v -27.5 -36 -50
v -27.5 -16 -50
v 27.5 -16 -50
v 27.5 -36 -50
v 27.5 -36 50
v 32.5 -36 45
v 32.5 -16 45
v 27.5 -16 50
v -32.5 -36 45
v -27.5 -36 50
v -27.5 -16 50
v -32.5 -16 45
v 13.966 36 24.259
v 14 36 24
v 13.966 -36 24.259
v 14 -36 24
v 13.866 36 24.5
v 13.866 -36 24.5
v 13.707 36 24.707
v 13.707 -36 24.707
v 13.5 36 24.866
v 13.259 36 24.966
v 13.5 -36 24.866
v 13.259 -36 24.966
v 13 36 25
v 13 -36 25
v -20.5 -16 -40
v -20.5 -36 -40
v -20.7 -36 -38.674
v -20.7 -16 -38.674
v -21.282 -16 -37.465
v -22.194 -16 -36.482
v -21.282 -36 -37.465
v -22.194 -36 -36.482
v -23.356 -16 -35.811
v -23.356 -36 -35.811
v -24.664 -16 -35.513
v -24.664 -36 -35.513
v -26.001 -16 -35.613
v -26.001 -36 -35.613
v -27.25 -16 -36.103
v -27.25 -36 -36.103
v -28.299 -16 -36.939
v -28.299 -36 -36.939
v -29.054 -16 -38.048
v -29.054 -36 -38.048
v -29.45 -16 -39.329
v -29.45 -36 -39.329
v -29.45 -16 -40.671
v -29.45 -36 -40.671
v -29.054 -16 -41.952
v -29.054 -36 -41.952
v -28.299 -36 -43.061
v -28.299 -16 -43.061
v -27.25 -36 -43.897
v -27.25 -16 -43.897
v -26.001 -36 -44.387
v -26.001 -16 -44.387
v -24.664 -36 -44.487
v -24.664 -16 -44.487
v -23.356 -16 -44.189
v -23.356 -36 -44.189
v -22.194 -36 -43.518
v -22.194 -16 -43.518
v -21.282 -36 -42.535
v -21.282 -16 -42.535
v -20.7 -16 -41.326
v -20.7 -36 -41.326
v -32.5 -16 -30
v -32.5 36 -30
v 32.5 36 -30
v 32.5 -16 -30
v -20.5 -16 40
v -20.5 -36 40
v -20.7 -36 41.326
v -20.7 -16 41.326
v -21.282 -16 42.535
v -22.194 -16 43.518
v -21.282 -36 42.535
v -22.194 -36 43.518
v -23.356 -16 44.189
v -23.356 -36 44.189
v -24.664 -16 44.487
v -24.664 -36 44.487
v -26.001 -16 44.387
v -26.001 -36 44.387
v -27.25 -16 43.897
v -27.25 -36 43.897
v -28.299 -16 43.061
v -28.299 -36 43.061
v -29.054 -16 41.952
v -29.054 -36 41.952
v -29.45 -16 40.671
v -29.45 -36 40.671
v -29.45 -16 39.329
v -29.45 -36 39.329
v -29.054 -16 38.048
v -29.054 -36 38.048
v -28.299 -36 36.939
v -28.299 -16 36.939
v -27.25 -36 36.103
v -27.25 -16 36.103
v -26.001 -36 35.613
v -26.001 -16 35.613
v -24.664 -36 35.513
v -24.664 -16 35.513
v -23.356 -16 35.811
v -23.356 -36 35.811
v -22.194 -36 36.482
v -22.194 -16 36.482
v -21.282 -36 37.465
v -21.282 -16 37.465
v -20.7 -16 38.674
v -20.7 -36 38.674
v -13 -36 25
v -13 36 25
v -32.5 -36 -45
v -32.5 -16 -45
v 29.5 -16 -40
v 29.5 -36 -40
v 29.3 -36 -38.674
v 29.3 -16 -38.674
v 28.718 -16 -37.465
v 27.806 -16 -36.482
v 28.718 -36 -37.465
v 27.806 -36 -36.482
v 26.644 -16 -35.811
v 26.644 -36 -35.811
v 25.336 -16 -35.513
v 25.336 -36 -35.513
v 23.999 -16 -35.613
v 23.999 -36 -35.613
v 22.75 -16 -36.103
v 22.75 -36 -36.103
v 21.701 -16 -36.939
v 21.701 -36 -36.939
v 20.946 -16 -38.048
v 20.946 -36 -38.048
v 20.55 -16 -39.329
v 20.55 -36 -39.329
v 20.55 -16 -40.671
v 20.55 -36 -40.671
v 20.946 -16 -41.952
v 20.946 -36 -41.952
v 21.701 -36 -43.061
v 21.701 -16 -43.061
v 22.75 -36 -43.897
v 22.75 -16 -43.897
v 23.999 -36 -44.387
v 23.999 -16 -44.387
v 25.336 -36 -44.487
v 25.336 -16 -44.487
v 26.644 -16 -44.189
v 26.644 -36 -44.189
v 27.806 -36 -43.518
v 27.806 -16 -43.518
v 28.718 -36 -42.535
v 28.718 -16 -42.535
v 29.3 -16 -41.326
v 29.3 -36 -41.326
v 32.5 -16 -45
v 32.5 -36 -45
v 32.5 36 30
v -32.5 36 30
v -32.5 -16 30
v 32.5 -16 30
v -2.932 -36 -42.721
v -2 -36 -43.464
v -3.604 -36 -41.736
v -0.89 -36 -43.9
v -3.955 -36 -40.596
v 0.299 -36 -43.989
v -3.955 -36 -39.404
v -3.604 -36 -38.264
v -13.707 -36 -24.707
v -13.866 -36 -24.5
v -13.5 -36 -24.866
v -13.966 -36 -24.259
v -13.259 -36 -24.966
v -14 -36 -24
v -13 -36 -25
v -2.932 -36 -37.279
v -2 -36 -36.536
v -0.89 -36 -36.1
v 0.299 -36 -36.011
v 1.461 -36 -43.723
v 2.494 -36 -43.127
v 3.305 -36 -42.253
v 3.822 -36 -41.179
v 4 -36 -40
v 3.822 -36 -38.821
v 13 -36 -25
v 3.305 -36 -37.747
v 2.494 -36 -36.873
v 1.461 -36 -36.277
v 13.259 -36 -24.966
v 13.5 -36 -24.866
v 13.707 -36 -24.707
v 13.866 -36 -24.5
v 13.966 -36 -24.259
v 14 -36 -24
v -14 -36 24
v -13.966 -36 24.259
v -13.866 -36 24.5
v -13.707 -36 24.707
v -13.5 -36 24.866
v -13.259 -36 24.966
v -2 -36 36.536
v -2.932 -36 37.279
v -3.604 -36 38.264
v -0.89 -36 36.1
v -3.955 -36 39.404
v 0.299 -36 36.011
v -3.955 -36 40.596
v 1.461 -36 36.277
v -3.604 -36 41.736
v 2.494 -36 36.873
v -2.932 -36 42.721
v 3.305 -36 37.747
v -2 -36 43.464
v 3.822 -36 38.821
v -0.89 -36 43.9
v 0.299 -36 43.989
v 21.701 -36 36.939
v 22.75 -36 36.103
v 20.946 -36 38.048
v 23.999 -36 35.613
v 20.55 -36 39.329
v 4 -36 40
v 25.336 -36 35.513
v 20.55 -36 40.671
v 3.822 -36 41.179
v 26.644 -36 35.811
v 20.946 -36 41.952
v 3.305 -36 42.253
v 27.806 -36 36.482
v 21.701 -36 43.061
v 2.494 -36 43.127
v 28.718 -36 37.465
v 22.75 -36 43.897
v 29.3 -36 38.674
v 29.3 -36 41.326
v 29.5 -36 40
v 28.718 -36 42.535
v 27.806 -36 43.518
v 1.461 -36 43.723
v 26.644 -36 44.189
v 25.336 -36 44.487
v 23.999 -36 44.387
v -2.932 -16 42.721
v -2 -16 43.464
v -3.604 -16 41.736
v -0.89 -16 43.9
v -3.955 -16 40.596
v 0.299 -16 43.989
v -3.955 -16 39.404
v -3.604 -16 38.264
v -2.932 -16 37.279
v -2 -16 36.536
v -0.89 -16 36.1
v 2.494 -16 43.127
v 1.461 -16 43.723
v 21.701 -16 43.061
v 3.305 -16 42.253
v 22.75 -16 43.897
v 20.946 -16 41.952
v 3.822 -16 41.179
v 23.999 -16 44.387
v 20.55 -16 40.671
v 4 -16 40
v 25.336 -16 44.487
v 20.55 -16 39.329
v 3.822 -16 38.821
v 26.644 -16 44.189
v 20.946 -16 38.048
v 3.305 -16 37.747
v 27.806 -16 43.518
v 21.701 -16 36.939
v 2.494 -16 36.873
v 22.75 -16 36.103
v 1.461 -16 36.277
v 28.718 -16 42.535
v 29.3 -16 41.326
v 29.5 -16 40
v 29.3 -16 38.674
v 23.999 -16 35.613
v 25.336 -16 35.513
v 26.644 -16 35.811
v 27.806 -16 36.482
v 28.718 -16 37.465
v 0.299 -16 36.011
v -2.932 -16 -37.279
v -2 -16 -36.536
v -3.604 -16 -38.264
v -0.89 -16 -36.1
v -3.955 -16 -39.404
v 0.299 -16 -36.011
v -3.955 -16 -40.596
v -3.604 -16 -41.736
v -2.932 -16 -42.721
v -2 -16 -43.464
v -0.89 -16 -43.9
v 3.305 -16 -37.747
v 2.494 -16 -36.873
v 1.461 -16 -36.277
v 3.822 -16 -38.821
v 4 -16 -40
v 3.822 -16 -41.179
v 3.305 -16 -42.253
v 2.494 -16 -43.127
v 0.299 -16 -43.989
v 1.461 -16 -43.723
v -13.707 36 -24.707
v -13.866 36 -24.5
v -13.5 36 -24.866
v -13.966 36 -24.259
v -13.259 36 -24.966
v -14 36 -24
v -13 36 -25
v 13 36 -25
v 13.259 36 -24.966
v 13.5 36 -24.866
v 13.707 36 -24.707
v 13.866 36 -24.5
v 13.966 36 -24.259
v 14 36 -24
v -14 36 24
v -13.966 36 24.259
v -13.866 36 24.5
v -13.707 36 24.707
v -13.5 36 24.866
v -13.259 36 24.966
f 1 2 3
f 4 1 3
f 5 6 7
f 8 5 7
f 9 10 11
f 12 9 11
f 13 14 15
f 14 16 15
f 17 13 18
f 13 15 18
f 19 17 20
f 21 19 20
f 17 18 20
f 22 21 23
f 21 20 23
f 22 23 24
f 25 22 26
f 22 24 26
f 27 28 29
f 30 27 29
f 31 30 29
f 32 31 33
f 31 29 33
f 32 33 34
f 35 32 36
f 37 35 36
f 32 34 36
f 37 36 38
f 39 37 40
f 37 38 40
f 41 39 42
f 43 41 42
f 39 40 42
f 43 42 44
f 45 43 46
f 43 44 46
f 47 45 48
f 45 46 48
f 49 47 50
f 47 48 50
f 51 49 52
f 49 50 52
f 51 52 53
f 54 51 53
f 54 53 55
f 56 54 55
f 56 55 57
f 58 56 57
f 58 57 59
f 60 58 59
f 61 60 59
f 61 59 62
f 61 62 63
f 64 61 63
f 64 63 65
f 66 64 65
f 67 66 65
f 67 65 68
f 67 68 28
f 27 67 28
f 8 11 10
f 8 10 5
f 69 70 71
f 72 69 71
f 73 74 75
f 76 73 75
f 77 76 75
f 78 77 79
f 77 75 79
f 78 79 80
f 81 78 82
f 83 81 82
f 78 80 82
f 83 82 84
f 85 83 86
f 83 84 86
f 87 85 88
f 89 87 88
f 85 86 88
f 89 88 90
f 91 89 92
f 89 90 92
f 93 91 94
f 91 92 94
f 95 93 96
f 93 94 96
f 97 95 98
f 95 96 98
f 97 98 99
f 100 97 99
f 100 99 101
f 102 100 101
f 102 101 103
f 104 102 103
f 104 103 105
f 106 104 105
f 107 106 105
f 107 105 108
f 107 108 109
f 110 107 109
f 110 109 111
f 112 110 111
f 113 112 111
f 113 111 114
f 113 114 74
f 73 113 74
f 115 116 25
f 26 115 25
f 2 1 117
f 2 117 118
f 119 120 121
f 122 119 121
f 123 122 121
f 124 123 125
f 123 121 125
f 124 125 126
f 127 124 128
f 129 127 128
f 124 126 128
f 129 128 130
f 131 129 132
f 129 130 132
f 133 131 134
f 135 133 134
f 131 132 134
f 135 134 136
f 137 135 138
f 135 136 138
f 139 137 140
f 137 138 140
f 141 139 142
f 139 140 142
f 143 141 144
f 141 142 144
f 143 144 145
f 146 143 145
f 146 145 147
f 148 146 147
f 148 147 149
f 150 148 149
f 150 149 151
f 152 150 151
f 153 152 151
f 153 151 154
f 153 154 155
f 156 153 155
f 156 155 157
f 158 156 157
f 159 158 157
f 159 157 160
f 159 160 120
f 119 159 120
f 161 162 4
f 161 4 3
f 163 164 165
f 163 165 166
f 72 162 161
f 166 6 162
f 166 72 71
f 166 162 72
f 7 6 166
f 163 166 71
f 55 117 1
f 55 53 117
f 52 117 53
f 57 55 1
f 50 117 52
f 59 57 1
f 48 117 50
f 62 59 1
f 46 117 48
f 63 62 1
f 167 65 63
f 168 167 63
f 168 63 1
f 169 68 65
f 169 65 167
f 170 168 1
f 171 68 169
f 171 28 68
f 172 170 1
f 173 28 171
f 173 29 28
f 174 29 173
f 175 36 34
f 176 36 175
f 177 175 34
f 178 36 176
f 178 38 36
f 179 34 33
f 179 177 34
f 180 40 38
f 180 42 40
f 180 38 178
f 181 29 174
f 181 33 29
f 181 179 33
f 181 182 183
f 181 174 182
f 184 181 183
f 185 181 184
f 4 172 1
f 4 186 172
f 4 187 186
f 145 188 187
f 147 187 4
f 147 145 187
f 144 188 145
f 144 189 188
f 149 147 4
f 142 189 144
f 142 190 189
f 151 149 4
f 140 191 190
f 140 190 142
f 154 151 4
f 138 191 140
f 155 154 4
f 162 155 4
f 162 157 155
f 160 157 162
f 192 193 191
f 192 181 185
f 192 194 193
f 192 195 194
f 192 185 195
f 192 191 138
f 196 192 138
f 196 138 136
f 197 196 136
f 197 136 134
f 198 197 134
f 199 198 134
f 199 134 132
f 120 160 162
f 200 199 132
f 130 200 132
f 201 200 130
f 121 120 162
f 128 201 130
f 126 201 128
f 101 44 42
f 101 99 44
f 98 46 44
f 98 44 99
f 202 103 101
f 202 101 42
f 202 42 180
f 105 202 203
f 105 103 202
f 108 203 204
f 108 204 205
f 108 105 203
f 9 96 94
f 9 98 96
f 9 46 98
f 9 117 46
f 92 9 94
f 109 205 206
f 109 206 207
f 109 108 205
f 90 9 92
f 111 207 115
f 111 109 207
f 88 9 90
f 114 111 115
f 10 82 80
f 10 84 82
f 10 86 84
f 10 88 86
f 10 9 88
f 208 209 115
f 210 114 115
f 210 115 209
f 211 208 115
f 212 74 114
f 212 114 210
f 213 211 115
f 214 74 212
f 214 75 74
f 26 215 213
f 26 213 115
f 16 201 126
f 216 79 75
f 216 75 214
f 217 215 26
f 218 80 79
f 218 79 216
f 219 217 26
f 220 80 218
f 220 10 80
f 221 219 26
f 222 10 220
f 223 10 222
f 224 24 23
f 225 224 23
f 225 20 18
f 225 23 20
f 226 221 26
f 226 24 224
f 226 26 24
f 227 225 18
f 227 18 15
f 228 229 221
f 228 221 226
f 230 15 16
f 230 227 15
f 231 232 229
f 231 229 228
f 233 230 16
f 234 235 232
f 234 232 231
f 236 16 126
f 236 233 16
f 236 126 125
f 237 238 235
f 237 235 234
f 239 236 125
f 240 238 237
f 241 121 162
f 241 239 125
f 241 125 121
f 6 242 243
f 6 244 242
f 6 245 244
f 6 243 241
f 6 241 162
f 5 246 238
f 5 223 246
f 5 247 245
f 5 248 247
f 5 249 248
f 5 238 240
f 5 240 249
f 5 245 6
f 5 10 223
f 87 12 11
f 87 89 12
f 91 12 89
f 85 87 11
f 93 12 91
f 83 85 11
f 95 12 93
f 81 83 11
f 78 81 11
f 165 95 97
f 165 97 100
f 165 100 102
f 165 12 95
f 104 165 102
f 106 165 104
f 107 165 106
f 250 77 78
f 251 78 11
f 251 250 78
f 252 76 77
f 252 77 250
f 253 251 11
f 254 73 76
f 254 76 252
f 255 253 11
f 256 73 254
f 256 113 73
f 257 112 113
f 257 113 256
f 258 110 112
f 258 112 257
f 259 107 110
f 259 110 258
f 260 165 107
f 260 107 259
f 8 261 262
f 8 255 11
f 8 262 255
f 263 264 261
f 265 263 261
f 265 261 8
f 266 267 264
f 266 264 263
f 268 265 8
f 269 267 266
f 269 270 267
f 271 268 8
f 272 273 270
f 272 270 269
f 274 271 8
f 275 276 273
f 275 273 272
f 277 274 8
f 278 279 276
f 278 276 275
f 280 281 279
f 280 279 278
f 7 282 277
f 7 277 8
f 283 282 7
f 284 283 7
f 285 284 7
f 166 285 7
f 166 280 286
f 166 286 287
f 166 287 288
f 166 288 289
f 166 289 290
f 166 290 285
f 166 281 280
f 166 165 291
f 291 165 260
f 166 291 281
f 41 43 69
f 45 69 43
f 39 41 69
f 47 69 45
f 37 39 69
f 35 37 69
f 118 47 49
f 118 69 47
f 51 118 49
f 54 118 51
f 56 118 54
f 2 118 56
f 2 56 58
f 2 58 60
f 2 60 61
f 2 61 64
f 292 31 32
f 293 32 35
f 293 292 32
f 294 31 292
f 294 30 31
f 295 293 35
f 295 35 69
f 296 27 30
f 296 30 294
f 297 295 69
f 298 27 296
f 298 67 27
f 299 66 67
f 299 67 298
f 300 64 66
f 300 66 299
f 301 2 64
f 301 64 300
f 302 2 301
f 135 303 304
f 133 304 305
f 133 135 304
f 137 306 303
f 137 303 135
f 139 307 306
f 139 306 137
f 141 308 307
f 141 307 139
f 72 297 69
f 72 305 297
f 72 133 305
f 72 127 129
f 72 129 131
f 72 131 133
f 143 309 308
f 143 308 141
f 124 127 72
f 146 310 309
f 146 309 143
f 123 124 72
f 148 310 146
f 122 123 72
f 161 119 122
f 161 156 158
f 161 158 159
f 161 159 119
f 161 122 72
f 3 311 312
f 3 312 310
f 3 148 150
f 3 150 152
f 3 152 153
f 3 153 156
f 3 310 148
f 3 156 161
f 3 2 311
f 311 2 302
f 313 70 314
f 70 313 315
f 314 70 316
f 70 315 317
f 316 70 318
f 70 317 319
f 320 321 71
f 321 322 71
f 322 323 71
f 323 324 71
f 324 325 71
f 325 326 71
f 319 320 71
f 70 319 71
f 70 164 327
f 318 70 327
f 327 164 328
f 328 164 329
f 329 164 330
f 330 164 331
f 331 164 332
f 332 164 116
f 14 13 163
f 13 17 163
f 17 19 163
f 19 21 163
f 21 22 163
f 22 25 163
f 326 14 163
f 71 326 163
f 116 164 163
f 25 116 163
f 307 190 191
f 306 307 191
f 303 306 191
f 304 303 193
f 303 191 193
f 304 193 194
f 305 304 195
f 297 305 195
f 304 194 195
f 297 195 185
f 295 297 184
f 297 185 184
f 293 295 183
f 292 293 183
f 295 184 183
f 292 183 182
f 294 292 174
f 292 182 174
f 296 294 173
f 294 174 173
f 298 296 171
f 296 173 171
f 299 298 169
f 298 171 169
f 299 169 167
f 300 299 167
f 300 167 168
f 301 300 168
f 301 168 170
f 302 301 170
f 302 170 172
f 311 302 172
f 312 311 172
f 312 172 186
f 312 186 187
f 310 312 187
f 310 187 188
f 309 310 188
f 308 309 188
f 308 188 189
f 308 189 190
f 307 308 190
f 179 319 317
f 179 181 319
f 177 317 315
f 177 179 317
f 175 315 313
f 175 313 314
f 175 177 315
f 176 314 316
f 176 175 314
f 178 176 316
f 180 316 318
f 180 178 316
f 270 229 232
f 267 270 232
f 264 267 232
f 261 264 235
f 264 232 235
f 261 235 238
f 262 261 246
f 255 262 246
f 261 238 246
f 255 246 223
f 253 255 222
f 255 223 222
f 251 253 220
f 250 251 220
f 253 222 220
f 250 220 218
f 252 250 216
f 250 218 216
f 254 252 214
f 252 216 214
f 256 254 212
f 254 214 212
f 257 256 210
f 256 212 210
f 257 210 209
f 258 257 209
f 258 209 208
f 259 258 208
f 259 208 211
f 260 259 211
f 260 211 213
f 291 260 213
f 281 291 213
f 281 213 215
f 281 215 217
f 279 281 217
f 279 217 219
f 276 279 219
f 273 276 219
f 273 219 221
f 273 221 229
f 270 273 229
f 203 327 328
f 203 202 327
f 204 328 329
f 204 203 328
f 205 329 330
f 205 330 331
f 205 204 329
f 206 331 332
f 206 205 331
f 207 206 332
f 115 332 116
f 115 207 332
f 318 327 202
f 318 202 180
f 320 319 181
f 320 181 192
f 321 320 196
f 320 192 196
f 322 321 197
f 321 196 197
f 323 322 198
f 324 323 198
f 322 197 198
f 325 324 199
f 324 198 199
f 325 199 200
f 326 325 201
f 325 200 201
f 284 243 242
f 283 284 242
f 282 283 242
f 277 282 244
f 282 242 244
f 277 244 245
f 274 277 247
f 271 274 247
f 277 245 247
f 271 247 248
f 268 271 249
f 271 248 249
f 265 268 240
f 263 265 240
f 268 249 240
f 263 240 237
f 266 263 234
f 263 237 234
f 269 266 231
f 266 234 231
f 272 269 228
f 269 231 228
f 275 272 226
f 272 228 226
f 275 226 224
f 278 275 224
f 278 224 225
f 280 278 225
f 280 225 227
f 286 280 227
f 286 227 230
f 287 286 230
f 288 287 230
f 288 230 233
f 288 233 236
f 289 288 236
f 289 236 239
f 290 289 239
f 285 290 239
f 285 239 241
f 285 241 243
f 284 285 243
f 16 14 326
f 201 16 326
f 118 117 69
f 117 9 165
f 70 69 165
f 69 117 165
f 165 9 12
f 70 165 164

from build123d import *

# Parameters (mm, degrees)
SKETCH_1_W            = 65
SKETCH_1_H            = 72
EXTRUDE_1_DEPTH       = 50
SKETCH_2_W            = 28
SKETCH_2_H            = 50
CUT_EXTRUDE_1_DEPTH   = 94.489304201
SKETCH_4_W            = 65
SKETCH_4_H            = 20
CUT_EXTRUDE_3_DEPTH   = 52
CHAMFER_1_SIZE        = 5
HOLE_WIZARD_9_0_9_1_D = 9
HOLE_WIZARD_8_0_8_1_D = 8
FILLET_1_R            = 1


with BuildPart() as part:
    # 草圖1 → 伸長1 (new, symmetric)
    with BuildSketch(Plane.XY):
        Rectangle(SKETCH_1_W, SKETCH_1_H)
    extrude(amount=EXTRUDE_1_DEPTH, both=True)

    # 草圖2 → 除料-伸長1 (cut, through all)
    with BuildSketch(Plane(origin=(0, 36, 0), x_dir=(1, 0, 0), z_dir=(0, 1, 0))):
        Rectangle(SKETCH_2_W, SKETCH_2_H)
    extrude(amount=-CUT_EXTRUDE_1_DEPTH, mode=Mode.SUBTRACT)

    # 草圖4 → 除料-伸長3 (cut)
    with BuildSketch(Plane(origin=(0, 36, 0), x_dir=(1, 0, 0), z_dir=(0, 1, 0))):
        with Locations((0, -40)):
            Rectangle(SKETCH_4_W, SKETCH_4_H)
        with Locations((0, 40)):
            Rectangle(SKETCH_4_W, SKETCH_4_H)
    extrude(amount=-CUT_EXTRUDE_3_DEPTH, mode=Mode.SUBTRACT)

    # 導角1
    chamfer_1_edges = [part.edges().sort_by_distance(p)[0] for p in [
        (32.5, -26, 50),
        (-32.5, -26, 50),
        (-32.5, -26, -50),
        (32.5, -26, -50),
    ]]
    chamfer(chamfer_1_edges, length=CHAMFER_1_SIZE)

    # Ø9.0 (9) 直徑孔1 (through all)
    with Locations(Plane(origin=(0, -16, 0), x_dir=(-1, 0, 0), z_dir=(0, 1, 0))):
        with Locations((25, -40), (-25, -40), (-25, 40), (25, 40)):
            Hole(HOLE_WIZARD_9_0_9_1_D / 2)

    # Ø8.0 (8) 直徑孔1 (through all)
    with Locations(Plane(origin=(0, -16, 0), x_dir=(-1, 0, 0), z_dir=(0, 1, 0))):
        with Locations((0, -40), (0, 40)):
            Hole(HOLE_WIZARD_8_0_8_1_D / 2)

    # 圓角1
    fillet_1_edges = [part.edges().sort_by_distance(p)[0] for p in [
        (-14, 0, 25),
        (-14, 0, -25),
        (14, 0, -25),
        (14, 0, 25),
    ]]
    fillet(fillet_1_edges, radius=FILLET_1_R)


solid = part.part
